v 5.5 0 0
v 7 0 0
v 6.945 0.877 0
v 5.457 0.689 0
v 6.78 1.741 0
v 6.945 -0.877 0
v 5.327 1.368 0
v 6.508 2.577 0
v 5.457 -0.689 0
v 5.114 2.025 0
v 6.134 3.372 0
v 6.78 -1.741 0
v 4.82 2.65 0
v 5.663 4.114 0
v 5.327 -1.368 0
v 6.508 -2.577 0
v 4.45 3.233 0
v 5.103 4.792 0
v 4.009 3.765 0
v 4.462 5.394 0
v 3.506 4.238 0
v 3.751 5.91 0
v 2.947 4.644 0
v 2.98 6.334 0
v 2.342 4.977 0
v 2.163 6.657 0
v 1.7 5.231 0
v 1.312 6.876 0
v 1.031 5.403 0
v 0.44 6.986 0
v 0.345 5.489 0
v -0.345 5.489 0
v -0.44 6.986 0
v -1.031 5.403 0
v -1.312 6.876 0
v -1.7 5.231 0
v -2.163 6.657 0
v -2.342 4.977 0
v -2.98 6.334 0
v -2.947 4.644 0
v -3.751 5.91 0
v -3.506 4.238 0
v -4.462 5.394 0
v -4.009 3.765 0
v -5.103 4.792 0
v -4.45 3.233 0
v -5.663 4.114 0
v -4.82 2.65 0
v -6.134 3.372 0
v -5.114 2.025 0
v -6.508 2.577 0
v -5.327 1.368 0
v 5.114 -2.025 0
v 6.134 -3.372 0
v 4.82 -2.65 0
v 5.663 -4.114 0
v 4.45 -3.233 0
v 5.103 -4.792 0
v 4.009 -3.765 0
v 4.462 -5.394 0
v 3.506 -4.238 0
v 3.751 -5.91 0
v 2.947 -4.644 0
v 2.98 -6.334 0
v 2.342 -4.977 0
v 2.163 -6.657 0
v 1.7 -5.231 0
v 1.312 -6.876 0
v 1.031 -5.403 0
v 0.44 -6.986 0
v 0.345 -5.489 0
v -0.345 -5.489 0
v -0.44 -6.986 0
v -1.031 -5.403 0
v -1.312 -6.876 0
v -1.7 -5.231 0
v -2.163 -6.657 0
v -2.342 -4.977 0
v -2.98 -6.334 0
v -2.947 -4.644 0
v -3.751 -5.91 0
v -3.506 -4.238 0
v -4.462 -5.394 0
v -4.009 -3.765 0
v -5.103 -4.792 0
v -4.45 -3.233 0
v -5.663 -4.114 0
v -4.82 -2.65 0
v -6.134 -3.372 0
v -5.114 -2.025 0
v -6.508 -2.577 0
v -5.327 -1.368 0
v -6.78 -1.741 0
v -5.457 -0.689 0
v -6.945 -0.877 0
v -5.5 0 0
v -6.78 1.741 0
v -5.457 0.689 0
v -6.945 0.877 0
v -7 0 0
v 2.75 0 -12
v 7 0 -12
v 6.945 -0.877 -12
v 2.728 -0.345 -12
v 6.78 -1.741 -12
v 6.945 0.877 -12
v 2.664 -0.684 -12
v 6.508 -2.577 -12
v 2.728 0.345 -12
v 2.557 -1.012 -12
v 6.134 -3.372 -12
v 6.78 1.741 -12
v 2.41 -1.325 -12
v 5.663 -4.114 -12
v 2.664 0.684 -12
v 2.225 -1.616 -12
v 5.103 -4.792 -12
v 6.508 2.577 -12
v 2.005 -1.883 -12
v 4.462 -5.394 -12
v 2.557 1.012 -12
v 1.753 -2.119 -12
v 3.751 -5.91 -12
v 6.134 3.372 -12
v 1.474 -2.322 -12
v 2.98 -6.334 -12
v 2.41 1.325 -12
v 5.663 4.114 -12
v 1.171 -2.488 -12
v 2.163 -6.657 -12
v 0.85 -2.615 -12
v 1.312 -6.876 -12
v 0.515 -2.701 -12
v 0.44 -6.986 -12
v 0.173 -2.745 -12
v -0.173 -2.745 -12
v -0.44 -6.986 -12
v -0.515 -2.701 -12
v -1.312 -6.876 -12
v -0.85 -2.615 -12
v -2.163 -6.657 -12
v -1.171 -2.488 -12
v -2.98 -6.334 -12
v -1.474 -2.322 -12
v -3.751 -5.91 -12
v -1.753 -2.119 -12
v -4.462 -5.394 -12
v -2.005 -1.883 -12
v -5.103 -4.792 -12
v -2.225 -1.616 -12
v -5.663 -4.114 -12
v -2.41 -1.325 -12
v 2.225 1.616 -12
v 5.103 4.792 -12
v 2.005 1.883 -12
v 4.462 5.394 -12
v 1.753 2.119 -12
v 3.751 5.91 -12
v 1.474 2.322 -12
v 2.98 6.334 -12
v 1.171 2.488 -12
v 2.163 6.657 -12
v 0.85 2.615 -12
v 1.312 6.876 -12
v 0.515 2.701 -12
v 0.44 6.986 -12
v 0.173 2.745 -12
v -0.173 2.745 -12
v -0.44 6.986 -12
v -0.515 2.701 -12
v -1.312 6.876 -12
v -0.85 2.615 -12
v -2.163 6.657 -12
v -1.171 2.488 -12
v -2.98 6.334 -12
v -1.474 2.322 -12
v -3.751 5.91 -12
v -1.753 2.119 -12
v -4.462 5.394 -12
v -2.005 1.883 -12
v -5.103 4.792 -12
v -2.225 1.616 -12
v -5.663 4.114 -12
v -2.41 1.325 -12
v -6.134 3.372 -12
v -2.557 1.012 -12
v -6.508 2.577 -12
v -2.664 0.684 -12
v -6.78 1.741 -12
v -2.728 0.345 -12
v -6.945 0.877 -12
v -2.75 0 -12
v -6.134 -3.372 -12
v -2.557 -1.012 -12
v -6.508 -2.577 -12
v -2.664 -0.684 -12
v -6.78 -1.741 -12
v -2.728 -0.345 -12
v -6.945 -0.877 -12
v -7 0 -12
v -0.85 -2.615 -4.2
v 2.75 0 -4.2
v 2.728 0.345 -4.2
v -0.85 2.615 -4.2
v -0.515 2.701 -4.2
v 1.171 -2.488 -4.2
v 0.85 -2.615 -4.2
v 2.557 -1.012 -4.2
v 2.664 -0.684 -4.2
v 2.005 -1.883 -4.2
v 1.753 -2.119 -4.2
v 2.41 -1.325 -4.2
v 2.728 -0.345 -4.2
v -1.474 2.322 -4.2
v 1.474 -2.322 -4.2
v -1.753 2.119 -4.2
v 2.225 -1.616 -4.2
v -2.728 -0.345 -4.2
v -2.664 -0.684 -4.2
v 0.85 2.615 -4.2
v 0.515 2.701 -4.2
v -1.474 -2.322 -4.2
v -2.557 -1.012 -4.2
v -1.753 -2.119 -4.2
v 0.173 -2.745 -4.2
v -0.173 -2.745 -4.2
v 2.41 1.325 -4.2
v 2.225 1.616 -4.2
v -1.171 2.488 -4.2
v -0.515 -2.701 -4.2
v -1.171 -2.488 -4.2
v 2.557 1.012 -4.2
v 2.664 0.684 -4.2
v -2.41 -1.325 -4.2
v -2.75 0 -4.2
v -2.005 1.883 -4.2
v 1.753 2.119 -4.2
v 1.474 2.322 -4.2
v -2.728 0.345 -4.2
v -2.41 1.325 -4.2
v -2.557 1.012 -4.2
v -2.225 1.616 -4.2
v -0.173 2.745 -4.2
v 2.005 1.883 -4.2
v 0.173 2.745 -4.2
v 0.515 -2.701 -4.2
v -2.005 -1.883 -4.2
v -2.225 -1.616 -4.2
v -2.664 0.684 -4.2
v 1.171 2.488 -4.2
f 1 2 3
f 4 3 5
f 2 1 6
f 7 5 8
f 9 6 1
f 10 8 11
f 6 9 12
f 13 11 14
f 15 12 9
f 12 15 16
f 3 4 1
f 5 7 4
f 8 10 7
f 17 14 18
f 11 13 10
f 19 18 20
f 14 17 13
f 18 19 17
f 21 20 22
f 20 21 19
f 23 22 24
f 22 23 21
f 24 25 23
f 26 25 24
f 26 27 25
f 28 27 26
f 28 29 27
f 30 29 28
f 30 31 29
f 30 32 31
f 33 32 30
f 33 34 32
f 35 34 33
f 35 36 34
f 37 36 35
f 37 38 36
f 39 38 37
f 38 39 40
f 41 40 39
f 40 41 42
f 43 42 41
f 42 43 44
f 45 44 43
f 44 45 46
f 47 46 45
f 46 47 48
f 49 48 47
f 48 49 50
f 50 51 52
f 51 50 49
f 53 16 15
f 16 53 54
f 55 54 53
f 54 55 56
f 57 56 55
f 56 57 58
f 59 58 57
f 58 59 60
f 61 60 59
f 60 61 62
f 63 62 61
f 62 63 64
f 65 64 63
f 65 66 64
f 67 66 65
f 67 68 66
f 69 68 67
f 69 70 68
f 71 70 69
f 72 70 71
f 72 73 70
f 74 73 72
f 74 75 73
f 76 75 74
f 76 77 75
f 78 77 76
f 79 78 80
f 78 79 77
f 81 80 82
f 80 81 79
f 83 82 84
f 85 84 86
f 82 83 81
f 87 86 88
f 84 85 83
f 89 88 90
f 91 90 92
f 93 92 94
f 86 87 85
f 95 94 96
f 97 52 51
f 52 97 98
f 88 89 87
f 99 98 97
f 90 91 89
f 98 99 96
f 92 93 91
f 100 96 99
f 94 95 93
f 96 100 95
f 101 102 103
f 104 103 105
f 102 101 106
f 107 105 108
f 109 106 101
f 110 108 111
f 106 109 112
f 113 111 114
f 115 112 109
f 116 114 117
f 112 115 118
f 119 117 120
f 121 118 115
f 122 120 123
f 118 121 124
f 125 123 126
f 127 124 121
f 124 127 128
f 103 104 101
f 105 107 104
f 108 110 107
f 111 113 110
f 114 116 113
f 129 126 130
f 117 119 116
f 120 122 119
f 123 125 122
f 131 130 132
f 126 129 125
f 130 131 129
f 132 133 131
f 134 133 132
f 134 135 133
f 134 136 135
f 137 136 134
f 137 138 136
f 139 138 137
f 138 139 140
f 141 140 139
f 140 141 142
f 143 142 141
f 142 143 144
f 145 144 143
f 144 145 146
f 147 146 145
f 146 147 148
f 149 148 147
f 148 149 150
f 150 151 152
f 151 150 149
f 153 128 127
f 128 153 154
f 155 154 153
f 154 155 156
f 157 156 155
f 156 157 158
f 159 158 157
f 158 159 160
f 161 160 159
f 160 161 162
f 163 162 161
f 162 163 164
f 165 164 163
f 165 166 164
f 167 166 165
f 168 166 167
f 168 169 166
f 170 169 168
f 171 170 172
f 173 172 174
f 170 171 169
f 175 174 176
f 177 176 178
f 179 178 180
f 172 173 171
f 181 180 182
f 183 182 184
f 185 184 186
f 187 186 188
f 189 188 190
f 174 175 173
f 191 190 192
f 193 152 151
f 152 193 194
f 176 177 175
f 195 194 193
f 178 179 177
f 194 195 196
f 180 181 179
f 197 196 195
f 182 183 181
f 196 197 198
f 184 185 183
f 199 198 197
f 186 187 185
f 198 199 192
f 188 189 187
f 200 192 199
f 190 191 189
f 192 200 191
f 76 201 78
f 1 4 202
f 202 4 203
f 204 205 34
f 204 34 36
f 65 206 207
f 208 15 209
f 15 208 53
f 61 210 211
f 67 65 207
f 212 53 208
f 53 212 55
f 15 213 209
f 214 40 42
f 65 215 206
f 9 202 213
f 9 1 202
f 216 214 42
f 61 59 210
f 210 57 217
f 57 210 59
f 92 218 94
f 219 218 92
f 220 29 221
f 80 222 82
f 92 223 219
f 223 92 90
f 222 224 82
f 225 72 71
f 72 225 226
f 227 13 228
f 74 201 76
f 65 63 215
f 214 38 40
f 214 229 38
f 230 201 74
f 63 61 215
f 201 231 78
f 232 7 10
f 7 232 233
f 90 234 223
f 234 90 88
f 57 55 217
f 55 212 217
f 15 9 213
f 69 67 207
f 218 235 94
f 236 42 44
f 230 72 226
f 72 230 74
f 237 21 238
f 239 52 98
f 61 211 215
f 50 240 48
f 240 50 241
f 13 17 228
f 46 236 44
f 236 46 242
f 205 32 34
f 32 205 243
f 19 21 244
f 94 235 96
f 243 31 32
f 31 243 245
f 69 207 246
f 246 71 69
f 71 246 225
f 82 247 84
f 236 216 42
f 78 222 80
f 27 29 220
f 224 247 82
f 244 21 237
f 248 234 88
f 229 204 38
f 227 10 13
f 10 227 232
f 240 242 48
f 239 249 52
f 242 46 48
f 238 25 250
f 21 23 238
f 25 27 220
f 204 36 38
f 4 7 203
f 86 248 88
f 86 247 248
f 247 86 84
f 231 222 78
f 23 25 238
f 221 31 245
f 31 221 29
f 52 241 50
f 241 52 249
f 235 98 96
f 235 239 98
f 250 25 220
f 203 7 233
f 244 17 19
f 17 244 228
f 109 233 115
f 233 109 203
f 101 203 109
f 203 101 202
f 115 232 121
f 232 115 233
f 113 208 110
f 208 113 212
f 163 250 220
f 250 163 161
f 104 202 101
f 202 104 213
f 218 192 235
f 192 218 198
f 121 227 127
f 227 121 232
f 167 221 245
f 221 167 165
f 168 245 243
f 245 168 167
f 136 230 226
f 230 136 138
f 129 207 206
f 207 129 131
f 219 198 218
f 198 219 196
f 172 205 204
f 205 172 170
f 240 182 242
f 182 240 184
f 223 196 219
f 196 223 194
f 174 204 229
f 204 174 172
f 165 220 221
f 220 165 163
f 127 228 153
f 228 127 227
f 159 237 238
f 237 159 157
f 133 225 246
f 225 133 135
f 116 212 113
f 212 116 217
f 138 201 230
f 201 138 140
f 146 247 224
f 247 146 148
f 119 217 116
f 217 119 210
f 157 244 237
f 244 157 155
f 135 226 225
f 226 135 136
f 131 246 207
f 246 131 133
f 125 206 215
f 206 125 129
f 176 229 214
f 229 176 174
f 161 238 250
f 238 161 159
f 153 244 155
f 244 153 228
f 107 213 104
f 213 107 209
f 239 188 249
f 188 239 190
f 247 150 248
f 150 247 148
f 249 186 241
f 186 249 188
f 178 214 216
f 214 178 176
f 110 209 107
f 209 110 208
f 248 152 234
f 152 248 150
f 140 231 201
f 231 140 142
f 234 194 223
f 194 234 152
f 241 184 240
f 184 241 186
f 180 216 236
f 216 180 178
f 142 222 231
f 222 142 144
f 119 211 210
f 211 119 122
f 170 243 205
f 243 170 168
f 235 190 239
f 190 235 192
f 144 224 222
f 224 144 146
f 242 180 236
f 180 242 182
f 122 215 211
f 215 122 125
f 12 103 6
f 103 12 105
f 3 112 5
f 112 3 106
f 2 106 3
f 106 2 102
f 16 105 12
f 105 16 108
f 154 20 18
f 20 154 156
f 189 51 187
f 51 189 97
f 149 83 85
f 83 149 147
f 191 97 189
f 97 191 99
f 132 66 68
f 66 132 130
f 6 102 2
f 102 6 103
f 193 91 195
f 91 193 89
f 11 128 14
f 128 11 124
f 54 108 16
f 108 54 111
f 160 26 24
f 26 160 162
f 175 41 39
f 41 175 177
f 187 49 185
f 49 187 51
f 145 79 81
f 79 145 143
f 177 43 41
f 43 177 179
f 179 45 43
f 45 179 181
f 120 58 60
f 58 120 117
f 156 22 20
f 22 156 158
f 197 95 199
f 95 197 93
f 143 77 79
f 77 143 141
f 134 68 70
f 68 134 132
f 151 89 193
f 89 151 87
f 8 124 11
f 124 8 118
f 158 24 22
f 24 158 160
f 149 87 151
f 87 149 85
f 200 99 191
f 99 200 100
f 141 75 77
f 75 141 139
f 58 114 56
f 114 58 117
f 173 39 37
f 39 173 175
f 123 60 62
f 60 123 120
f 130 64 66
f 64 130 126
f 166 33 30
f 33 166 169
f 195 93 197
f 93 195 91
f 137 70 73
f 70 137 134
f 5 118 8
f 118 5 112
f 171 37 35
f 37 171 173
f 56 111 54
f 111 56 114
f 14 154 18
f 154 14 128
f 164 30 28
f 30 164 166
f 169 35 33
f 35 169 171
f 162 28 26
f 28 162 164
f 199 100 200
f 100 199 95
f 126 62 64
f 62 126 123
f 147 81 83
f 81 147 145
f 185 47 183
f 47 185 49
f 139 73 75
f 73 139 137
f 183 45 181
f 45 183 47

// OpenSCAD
$fn = 50;


difference() {
	union() {
		translate(v = [0, 0, -12.0000000000]) {
			cylinder(h = 12, r = 7.0000000000);
		}
		cylinder(h = 0, r = 16.0000000000);
	}
	union() {
		translate(v = [0, 0, 0]) {
			rotate(a = [0, 0, 0]) {
				difference() {
					union() {
						#translate(v = [0, 0, -12.0000000000]) {
							cylinder(h = 12, r = 2.2500000000);
						}
						#translate(v = [0, 0, -4.2000000000]) {
							cylinder(h = 4.2000000000, r1 = 2.7500000000, r2 = 5.5000000000);
						}
						#translate(v = [0, 0, -12.0000000000]) {
							cylinder(h = 12, r = 2.7500000000);
						}
						#translate(v = [0, 0, -12.0000000000]) {
							cylinder(h = 12, r = 2.2500000000);
						}
					}
					union();
				}
			}
		}
	}
}
